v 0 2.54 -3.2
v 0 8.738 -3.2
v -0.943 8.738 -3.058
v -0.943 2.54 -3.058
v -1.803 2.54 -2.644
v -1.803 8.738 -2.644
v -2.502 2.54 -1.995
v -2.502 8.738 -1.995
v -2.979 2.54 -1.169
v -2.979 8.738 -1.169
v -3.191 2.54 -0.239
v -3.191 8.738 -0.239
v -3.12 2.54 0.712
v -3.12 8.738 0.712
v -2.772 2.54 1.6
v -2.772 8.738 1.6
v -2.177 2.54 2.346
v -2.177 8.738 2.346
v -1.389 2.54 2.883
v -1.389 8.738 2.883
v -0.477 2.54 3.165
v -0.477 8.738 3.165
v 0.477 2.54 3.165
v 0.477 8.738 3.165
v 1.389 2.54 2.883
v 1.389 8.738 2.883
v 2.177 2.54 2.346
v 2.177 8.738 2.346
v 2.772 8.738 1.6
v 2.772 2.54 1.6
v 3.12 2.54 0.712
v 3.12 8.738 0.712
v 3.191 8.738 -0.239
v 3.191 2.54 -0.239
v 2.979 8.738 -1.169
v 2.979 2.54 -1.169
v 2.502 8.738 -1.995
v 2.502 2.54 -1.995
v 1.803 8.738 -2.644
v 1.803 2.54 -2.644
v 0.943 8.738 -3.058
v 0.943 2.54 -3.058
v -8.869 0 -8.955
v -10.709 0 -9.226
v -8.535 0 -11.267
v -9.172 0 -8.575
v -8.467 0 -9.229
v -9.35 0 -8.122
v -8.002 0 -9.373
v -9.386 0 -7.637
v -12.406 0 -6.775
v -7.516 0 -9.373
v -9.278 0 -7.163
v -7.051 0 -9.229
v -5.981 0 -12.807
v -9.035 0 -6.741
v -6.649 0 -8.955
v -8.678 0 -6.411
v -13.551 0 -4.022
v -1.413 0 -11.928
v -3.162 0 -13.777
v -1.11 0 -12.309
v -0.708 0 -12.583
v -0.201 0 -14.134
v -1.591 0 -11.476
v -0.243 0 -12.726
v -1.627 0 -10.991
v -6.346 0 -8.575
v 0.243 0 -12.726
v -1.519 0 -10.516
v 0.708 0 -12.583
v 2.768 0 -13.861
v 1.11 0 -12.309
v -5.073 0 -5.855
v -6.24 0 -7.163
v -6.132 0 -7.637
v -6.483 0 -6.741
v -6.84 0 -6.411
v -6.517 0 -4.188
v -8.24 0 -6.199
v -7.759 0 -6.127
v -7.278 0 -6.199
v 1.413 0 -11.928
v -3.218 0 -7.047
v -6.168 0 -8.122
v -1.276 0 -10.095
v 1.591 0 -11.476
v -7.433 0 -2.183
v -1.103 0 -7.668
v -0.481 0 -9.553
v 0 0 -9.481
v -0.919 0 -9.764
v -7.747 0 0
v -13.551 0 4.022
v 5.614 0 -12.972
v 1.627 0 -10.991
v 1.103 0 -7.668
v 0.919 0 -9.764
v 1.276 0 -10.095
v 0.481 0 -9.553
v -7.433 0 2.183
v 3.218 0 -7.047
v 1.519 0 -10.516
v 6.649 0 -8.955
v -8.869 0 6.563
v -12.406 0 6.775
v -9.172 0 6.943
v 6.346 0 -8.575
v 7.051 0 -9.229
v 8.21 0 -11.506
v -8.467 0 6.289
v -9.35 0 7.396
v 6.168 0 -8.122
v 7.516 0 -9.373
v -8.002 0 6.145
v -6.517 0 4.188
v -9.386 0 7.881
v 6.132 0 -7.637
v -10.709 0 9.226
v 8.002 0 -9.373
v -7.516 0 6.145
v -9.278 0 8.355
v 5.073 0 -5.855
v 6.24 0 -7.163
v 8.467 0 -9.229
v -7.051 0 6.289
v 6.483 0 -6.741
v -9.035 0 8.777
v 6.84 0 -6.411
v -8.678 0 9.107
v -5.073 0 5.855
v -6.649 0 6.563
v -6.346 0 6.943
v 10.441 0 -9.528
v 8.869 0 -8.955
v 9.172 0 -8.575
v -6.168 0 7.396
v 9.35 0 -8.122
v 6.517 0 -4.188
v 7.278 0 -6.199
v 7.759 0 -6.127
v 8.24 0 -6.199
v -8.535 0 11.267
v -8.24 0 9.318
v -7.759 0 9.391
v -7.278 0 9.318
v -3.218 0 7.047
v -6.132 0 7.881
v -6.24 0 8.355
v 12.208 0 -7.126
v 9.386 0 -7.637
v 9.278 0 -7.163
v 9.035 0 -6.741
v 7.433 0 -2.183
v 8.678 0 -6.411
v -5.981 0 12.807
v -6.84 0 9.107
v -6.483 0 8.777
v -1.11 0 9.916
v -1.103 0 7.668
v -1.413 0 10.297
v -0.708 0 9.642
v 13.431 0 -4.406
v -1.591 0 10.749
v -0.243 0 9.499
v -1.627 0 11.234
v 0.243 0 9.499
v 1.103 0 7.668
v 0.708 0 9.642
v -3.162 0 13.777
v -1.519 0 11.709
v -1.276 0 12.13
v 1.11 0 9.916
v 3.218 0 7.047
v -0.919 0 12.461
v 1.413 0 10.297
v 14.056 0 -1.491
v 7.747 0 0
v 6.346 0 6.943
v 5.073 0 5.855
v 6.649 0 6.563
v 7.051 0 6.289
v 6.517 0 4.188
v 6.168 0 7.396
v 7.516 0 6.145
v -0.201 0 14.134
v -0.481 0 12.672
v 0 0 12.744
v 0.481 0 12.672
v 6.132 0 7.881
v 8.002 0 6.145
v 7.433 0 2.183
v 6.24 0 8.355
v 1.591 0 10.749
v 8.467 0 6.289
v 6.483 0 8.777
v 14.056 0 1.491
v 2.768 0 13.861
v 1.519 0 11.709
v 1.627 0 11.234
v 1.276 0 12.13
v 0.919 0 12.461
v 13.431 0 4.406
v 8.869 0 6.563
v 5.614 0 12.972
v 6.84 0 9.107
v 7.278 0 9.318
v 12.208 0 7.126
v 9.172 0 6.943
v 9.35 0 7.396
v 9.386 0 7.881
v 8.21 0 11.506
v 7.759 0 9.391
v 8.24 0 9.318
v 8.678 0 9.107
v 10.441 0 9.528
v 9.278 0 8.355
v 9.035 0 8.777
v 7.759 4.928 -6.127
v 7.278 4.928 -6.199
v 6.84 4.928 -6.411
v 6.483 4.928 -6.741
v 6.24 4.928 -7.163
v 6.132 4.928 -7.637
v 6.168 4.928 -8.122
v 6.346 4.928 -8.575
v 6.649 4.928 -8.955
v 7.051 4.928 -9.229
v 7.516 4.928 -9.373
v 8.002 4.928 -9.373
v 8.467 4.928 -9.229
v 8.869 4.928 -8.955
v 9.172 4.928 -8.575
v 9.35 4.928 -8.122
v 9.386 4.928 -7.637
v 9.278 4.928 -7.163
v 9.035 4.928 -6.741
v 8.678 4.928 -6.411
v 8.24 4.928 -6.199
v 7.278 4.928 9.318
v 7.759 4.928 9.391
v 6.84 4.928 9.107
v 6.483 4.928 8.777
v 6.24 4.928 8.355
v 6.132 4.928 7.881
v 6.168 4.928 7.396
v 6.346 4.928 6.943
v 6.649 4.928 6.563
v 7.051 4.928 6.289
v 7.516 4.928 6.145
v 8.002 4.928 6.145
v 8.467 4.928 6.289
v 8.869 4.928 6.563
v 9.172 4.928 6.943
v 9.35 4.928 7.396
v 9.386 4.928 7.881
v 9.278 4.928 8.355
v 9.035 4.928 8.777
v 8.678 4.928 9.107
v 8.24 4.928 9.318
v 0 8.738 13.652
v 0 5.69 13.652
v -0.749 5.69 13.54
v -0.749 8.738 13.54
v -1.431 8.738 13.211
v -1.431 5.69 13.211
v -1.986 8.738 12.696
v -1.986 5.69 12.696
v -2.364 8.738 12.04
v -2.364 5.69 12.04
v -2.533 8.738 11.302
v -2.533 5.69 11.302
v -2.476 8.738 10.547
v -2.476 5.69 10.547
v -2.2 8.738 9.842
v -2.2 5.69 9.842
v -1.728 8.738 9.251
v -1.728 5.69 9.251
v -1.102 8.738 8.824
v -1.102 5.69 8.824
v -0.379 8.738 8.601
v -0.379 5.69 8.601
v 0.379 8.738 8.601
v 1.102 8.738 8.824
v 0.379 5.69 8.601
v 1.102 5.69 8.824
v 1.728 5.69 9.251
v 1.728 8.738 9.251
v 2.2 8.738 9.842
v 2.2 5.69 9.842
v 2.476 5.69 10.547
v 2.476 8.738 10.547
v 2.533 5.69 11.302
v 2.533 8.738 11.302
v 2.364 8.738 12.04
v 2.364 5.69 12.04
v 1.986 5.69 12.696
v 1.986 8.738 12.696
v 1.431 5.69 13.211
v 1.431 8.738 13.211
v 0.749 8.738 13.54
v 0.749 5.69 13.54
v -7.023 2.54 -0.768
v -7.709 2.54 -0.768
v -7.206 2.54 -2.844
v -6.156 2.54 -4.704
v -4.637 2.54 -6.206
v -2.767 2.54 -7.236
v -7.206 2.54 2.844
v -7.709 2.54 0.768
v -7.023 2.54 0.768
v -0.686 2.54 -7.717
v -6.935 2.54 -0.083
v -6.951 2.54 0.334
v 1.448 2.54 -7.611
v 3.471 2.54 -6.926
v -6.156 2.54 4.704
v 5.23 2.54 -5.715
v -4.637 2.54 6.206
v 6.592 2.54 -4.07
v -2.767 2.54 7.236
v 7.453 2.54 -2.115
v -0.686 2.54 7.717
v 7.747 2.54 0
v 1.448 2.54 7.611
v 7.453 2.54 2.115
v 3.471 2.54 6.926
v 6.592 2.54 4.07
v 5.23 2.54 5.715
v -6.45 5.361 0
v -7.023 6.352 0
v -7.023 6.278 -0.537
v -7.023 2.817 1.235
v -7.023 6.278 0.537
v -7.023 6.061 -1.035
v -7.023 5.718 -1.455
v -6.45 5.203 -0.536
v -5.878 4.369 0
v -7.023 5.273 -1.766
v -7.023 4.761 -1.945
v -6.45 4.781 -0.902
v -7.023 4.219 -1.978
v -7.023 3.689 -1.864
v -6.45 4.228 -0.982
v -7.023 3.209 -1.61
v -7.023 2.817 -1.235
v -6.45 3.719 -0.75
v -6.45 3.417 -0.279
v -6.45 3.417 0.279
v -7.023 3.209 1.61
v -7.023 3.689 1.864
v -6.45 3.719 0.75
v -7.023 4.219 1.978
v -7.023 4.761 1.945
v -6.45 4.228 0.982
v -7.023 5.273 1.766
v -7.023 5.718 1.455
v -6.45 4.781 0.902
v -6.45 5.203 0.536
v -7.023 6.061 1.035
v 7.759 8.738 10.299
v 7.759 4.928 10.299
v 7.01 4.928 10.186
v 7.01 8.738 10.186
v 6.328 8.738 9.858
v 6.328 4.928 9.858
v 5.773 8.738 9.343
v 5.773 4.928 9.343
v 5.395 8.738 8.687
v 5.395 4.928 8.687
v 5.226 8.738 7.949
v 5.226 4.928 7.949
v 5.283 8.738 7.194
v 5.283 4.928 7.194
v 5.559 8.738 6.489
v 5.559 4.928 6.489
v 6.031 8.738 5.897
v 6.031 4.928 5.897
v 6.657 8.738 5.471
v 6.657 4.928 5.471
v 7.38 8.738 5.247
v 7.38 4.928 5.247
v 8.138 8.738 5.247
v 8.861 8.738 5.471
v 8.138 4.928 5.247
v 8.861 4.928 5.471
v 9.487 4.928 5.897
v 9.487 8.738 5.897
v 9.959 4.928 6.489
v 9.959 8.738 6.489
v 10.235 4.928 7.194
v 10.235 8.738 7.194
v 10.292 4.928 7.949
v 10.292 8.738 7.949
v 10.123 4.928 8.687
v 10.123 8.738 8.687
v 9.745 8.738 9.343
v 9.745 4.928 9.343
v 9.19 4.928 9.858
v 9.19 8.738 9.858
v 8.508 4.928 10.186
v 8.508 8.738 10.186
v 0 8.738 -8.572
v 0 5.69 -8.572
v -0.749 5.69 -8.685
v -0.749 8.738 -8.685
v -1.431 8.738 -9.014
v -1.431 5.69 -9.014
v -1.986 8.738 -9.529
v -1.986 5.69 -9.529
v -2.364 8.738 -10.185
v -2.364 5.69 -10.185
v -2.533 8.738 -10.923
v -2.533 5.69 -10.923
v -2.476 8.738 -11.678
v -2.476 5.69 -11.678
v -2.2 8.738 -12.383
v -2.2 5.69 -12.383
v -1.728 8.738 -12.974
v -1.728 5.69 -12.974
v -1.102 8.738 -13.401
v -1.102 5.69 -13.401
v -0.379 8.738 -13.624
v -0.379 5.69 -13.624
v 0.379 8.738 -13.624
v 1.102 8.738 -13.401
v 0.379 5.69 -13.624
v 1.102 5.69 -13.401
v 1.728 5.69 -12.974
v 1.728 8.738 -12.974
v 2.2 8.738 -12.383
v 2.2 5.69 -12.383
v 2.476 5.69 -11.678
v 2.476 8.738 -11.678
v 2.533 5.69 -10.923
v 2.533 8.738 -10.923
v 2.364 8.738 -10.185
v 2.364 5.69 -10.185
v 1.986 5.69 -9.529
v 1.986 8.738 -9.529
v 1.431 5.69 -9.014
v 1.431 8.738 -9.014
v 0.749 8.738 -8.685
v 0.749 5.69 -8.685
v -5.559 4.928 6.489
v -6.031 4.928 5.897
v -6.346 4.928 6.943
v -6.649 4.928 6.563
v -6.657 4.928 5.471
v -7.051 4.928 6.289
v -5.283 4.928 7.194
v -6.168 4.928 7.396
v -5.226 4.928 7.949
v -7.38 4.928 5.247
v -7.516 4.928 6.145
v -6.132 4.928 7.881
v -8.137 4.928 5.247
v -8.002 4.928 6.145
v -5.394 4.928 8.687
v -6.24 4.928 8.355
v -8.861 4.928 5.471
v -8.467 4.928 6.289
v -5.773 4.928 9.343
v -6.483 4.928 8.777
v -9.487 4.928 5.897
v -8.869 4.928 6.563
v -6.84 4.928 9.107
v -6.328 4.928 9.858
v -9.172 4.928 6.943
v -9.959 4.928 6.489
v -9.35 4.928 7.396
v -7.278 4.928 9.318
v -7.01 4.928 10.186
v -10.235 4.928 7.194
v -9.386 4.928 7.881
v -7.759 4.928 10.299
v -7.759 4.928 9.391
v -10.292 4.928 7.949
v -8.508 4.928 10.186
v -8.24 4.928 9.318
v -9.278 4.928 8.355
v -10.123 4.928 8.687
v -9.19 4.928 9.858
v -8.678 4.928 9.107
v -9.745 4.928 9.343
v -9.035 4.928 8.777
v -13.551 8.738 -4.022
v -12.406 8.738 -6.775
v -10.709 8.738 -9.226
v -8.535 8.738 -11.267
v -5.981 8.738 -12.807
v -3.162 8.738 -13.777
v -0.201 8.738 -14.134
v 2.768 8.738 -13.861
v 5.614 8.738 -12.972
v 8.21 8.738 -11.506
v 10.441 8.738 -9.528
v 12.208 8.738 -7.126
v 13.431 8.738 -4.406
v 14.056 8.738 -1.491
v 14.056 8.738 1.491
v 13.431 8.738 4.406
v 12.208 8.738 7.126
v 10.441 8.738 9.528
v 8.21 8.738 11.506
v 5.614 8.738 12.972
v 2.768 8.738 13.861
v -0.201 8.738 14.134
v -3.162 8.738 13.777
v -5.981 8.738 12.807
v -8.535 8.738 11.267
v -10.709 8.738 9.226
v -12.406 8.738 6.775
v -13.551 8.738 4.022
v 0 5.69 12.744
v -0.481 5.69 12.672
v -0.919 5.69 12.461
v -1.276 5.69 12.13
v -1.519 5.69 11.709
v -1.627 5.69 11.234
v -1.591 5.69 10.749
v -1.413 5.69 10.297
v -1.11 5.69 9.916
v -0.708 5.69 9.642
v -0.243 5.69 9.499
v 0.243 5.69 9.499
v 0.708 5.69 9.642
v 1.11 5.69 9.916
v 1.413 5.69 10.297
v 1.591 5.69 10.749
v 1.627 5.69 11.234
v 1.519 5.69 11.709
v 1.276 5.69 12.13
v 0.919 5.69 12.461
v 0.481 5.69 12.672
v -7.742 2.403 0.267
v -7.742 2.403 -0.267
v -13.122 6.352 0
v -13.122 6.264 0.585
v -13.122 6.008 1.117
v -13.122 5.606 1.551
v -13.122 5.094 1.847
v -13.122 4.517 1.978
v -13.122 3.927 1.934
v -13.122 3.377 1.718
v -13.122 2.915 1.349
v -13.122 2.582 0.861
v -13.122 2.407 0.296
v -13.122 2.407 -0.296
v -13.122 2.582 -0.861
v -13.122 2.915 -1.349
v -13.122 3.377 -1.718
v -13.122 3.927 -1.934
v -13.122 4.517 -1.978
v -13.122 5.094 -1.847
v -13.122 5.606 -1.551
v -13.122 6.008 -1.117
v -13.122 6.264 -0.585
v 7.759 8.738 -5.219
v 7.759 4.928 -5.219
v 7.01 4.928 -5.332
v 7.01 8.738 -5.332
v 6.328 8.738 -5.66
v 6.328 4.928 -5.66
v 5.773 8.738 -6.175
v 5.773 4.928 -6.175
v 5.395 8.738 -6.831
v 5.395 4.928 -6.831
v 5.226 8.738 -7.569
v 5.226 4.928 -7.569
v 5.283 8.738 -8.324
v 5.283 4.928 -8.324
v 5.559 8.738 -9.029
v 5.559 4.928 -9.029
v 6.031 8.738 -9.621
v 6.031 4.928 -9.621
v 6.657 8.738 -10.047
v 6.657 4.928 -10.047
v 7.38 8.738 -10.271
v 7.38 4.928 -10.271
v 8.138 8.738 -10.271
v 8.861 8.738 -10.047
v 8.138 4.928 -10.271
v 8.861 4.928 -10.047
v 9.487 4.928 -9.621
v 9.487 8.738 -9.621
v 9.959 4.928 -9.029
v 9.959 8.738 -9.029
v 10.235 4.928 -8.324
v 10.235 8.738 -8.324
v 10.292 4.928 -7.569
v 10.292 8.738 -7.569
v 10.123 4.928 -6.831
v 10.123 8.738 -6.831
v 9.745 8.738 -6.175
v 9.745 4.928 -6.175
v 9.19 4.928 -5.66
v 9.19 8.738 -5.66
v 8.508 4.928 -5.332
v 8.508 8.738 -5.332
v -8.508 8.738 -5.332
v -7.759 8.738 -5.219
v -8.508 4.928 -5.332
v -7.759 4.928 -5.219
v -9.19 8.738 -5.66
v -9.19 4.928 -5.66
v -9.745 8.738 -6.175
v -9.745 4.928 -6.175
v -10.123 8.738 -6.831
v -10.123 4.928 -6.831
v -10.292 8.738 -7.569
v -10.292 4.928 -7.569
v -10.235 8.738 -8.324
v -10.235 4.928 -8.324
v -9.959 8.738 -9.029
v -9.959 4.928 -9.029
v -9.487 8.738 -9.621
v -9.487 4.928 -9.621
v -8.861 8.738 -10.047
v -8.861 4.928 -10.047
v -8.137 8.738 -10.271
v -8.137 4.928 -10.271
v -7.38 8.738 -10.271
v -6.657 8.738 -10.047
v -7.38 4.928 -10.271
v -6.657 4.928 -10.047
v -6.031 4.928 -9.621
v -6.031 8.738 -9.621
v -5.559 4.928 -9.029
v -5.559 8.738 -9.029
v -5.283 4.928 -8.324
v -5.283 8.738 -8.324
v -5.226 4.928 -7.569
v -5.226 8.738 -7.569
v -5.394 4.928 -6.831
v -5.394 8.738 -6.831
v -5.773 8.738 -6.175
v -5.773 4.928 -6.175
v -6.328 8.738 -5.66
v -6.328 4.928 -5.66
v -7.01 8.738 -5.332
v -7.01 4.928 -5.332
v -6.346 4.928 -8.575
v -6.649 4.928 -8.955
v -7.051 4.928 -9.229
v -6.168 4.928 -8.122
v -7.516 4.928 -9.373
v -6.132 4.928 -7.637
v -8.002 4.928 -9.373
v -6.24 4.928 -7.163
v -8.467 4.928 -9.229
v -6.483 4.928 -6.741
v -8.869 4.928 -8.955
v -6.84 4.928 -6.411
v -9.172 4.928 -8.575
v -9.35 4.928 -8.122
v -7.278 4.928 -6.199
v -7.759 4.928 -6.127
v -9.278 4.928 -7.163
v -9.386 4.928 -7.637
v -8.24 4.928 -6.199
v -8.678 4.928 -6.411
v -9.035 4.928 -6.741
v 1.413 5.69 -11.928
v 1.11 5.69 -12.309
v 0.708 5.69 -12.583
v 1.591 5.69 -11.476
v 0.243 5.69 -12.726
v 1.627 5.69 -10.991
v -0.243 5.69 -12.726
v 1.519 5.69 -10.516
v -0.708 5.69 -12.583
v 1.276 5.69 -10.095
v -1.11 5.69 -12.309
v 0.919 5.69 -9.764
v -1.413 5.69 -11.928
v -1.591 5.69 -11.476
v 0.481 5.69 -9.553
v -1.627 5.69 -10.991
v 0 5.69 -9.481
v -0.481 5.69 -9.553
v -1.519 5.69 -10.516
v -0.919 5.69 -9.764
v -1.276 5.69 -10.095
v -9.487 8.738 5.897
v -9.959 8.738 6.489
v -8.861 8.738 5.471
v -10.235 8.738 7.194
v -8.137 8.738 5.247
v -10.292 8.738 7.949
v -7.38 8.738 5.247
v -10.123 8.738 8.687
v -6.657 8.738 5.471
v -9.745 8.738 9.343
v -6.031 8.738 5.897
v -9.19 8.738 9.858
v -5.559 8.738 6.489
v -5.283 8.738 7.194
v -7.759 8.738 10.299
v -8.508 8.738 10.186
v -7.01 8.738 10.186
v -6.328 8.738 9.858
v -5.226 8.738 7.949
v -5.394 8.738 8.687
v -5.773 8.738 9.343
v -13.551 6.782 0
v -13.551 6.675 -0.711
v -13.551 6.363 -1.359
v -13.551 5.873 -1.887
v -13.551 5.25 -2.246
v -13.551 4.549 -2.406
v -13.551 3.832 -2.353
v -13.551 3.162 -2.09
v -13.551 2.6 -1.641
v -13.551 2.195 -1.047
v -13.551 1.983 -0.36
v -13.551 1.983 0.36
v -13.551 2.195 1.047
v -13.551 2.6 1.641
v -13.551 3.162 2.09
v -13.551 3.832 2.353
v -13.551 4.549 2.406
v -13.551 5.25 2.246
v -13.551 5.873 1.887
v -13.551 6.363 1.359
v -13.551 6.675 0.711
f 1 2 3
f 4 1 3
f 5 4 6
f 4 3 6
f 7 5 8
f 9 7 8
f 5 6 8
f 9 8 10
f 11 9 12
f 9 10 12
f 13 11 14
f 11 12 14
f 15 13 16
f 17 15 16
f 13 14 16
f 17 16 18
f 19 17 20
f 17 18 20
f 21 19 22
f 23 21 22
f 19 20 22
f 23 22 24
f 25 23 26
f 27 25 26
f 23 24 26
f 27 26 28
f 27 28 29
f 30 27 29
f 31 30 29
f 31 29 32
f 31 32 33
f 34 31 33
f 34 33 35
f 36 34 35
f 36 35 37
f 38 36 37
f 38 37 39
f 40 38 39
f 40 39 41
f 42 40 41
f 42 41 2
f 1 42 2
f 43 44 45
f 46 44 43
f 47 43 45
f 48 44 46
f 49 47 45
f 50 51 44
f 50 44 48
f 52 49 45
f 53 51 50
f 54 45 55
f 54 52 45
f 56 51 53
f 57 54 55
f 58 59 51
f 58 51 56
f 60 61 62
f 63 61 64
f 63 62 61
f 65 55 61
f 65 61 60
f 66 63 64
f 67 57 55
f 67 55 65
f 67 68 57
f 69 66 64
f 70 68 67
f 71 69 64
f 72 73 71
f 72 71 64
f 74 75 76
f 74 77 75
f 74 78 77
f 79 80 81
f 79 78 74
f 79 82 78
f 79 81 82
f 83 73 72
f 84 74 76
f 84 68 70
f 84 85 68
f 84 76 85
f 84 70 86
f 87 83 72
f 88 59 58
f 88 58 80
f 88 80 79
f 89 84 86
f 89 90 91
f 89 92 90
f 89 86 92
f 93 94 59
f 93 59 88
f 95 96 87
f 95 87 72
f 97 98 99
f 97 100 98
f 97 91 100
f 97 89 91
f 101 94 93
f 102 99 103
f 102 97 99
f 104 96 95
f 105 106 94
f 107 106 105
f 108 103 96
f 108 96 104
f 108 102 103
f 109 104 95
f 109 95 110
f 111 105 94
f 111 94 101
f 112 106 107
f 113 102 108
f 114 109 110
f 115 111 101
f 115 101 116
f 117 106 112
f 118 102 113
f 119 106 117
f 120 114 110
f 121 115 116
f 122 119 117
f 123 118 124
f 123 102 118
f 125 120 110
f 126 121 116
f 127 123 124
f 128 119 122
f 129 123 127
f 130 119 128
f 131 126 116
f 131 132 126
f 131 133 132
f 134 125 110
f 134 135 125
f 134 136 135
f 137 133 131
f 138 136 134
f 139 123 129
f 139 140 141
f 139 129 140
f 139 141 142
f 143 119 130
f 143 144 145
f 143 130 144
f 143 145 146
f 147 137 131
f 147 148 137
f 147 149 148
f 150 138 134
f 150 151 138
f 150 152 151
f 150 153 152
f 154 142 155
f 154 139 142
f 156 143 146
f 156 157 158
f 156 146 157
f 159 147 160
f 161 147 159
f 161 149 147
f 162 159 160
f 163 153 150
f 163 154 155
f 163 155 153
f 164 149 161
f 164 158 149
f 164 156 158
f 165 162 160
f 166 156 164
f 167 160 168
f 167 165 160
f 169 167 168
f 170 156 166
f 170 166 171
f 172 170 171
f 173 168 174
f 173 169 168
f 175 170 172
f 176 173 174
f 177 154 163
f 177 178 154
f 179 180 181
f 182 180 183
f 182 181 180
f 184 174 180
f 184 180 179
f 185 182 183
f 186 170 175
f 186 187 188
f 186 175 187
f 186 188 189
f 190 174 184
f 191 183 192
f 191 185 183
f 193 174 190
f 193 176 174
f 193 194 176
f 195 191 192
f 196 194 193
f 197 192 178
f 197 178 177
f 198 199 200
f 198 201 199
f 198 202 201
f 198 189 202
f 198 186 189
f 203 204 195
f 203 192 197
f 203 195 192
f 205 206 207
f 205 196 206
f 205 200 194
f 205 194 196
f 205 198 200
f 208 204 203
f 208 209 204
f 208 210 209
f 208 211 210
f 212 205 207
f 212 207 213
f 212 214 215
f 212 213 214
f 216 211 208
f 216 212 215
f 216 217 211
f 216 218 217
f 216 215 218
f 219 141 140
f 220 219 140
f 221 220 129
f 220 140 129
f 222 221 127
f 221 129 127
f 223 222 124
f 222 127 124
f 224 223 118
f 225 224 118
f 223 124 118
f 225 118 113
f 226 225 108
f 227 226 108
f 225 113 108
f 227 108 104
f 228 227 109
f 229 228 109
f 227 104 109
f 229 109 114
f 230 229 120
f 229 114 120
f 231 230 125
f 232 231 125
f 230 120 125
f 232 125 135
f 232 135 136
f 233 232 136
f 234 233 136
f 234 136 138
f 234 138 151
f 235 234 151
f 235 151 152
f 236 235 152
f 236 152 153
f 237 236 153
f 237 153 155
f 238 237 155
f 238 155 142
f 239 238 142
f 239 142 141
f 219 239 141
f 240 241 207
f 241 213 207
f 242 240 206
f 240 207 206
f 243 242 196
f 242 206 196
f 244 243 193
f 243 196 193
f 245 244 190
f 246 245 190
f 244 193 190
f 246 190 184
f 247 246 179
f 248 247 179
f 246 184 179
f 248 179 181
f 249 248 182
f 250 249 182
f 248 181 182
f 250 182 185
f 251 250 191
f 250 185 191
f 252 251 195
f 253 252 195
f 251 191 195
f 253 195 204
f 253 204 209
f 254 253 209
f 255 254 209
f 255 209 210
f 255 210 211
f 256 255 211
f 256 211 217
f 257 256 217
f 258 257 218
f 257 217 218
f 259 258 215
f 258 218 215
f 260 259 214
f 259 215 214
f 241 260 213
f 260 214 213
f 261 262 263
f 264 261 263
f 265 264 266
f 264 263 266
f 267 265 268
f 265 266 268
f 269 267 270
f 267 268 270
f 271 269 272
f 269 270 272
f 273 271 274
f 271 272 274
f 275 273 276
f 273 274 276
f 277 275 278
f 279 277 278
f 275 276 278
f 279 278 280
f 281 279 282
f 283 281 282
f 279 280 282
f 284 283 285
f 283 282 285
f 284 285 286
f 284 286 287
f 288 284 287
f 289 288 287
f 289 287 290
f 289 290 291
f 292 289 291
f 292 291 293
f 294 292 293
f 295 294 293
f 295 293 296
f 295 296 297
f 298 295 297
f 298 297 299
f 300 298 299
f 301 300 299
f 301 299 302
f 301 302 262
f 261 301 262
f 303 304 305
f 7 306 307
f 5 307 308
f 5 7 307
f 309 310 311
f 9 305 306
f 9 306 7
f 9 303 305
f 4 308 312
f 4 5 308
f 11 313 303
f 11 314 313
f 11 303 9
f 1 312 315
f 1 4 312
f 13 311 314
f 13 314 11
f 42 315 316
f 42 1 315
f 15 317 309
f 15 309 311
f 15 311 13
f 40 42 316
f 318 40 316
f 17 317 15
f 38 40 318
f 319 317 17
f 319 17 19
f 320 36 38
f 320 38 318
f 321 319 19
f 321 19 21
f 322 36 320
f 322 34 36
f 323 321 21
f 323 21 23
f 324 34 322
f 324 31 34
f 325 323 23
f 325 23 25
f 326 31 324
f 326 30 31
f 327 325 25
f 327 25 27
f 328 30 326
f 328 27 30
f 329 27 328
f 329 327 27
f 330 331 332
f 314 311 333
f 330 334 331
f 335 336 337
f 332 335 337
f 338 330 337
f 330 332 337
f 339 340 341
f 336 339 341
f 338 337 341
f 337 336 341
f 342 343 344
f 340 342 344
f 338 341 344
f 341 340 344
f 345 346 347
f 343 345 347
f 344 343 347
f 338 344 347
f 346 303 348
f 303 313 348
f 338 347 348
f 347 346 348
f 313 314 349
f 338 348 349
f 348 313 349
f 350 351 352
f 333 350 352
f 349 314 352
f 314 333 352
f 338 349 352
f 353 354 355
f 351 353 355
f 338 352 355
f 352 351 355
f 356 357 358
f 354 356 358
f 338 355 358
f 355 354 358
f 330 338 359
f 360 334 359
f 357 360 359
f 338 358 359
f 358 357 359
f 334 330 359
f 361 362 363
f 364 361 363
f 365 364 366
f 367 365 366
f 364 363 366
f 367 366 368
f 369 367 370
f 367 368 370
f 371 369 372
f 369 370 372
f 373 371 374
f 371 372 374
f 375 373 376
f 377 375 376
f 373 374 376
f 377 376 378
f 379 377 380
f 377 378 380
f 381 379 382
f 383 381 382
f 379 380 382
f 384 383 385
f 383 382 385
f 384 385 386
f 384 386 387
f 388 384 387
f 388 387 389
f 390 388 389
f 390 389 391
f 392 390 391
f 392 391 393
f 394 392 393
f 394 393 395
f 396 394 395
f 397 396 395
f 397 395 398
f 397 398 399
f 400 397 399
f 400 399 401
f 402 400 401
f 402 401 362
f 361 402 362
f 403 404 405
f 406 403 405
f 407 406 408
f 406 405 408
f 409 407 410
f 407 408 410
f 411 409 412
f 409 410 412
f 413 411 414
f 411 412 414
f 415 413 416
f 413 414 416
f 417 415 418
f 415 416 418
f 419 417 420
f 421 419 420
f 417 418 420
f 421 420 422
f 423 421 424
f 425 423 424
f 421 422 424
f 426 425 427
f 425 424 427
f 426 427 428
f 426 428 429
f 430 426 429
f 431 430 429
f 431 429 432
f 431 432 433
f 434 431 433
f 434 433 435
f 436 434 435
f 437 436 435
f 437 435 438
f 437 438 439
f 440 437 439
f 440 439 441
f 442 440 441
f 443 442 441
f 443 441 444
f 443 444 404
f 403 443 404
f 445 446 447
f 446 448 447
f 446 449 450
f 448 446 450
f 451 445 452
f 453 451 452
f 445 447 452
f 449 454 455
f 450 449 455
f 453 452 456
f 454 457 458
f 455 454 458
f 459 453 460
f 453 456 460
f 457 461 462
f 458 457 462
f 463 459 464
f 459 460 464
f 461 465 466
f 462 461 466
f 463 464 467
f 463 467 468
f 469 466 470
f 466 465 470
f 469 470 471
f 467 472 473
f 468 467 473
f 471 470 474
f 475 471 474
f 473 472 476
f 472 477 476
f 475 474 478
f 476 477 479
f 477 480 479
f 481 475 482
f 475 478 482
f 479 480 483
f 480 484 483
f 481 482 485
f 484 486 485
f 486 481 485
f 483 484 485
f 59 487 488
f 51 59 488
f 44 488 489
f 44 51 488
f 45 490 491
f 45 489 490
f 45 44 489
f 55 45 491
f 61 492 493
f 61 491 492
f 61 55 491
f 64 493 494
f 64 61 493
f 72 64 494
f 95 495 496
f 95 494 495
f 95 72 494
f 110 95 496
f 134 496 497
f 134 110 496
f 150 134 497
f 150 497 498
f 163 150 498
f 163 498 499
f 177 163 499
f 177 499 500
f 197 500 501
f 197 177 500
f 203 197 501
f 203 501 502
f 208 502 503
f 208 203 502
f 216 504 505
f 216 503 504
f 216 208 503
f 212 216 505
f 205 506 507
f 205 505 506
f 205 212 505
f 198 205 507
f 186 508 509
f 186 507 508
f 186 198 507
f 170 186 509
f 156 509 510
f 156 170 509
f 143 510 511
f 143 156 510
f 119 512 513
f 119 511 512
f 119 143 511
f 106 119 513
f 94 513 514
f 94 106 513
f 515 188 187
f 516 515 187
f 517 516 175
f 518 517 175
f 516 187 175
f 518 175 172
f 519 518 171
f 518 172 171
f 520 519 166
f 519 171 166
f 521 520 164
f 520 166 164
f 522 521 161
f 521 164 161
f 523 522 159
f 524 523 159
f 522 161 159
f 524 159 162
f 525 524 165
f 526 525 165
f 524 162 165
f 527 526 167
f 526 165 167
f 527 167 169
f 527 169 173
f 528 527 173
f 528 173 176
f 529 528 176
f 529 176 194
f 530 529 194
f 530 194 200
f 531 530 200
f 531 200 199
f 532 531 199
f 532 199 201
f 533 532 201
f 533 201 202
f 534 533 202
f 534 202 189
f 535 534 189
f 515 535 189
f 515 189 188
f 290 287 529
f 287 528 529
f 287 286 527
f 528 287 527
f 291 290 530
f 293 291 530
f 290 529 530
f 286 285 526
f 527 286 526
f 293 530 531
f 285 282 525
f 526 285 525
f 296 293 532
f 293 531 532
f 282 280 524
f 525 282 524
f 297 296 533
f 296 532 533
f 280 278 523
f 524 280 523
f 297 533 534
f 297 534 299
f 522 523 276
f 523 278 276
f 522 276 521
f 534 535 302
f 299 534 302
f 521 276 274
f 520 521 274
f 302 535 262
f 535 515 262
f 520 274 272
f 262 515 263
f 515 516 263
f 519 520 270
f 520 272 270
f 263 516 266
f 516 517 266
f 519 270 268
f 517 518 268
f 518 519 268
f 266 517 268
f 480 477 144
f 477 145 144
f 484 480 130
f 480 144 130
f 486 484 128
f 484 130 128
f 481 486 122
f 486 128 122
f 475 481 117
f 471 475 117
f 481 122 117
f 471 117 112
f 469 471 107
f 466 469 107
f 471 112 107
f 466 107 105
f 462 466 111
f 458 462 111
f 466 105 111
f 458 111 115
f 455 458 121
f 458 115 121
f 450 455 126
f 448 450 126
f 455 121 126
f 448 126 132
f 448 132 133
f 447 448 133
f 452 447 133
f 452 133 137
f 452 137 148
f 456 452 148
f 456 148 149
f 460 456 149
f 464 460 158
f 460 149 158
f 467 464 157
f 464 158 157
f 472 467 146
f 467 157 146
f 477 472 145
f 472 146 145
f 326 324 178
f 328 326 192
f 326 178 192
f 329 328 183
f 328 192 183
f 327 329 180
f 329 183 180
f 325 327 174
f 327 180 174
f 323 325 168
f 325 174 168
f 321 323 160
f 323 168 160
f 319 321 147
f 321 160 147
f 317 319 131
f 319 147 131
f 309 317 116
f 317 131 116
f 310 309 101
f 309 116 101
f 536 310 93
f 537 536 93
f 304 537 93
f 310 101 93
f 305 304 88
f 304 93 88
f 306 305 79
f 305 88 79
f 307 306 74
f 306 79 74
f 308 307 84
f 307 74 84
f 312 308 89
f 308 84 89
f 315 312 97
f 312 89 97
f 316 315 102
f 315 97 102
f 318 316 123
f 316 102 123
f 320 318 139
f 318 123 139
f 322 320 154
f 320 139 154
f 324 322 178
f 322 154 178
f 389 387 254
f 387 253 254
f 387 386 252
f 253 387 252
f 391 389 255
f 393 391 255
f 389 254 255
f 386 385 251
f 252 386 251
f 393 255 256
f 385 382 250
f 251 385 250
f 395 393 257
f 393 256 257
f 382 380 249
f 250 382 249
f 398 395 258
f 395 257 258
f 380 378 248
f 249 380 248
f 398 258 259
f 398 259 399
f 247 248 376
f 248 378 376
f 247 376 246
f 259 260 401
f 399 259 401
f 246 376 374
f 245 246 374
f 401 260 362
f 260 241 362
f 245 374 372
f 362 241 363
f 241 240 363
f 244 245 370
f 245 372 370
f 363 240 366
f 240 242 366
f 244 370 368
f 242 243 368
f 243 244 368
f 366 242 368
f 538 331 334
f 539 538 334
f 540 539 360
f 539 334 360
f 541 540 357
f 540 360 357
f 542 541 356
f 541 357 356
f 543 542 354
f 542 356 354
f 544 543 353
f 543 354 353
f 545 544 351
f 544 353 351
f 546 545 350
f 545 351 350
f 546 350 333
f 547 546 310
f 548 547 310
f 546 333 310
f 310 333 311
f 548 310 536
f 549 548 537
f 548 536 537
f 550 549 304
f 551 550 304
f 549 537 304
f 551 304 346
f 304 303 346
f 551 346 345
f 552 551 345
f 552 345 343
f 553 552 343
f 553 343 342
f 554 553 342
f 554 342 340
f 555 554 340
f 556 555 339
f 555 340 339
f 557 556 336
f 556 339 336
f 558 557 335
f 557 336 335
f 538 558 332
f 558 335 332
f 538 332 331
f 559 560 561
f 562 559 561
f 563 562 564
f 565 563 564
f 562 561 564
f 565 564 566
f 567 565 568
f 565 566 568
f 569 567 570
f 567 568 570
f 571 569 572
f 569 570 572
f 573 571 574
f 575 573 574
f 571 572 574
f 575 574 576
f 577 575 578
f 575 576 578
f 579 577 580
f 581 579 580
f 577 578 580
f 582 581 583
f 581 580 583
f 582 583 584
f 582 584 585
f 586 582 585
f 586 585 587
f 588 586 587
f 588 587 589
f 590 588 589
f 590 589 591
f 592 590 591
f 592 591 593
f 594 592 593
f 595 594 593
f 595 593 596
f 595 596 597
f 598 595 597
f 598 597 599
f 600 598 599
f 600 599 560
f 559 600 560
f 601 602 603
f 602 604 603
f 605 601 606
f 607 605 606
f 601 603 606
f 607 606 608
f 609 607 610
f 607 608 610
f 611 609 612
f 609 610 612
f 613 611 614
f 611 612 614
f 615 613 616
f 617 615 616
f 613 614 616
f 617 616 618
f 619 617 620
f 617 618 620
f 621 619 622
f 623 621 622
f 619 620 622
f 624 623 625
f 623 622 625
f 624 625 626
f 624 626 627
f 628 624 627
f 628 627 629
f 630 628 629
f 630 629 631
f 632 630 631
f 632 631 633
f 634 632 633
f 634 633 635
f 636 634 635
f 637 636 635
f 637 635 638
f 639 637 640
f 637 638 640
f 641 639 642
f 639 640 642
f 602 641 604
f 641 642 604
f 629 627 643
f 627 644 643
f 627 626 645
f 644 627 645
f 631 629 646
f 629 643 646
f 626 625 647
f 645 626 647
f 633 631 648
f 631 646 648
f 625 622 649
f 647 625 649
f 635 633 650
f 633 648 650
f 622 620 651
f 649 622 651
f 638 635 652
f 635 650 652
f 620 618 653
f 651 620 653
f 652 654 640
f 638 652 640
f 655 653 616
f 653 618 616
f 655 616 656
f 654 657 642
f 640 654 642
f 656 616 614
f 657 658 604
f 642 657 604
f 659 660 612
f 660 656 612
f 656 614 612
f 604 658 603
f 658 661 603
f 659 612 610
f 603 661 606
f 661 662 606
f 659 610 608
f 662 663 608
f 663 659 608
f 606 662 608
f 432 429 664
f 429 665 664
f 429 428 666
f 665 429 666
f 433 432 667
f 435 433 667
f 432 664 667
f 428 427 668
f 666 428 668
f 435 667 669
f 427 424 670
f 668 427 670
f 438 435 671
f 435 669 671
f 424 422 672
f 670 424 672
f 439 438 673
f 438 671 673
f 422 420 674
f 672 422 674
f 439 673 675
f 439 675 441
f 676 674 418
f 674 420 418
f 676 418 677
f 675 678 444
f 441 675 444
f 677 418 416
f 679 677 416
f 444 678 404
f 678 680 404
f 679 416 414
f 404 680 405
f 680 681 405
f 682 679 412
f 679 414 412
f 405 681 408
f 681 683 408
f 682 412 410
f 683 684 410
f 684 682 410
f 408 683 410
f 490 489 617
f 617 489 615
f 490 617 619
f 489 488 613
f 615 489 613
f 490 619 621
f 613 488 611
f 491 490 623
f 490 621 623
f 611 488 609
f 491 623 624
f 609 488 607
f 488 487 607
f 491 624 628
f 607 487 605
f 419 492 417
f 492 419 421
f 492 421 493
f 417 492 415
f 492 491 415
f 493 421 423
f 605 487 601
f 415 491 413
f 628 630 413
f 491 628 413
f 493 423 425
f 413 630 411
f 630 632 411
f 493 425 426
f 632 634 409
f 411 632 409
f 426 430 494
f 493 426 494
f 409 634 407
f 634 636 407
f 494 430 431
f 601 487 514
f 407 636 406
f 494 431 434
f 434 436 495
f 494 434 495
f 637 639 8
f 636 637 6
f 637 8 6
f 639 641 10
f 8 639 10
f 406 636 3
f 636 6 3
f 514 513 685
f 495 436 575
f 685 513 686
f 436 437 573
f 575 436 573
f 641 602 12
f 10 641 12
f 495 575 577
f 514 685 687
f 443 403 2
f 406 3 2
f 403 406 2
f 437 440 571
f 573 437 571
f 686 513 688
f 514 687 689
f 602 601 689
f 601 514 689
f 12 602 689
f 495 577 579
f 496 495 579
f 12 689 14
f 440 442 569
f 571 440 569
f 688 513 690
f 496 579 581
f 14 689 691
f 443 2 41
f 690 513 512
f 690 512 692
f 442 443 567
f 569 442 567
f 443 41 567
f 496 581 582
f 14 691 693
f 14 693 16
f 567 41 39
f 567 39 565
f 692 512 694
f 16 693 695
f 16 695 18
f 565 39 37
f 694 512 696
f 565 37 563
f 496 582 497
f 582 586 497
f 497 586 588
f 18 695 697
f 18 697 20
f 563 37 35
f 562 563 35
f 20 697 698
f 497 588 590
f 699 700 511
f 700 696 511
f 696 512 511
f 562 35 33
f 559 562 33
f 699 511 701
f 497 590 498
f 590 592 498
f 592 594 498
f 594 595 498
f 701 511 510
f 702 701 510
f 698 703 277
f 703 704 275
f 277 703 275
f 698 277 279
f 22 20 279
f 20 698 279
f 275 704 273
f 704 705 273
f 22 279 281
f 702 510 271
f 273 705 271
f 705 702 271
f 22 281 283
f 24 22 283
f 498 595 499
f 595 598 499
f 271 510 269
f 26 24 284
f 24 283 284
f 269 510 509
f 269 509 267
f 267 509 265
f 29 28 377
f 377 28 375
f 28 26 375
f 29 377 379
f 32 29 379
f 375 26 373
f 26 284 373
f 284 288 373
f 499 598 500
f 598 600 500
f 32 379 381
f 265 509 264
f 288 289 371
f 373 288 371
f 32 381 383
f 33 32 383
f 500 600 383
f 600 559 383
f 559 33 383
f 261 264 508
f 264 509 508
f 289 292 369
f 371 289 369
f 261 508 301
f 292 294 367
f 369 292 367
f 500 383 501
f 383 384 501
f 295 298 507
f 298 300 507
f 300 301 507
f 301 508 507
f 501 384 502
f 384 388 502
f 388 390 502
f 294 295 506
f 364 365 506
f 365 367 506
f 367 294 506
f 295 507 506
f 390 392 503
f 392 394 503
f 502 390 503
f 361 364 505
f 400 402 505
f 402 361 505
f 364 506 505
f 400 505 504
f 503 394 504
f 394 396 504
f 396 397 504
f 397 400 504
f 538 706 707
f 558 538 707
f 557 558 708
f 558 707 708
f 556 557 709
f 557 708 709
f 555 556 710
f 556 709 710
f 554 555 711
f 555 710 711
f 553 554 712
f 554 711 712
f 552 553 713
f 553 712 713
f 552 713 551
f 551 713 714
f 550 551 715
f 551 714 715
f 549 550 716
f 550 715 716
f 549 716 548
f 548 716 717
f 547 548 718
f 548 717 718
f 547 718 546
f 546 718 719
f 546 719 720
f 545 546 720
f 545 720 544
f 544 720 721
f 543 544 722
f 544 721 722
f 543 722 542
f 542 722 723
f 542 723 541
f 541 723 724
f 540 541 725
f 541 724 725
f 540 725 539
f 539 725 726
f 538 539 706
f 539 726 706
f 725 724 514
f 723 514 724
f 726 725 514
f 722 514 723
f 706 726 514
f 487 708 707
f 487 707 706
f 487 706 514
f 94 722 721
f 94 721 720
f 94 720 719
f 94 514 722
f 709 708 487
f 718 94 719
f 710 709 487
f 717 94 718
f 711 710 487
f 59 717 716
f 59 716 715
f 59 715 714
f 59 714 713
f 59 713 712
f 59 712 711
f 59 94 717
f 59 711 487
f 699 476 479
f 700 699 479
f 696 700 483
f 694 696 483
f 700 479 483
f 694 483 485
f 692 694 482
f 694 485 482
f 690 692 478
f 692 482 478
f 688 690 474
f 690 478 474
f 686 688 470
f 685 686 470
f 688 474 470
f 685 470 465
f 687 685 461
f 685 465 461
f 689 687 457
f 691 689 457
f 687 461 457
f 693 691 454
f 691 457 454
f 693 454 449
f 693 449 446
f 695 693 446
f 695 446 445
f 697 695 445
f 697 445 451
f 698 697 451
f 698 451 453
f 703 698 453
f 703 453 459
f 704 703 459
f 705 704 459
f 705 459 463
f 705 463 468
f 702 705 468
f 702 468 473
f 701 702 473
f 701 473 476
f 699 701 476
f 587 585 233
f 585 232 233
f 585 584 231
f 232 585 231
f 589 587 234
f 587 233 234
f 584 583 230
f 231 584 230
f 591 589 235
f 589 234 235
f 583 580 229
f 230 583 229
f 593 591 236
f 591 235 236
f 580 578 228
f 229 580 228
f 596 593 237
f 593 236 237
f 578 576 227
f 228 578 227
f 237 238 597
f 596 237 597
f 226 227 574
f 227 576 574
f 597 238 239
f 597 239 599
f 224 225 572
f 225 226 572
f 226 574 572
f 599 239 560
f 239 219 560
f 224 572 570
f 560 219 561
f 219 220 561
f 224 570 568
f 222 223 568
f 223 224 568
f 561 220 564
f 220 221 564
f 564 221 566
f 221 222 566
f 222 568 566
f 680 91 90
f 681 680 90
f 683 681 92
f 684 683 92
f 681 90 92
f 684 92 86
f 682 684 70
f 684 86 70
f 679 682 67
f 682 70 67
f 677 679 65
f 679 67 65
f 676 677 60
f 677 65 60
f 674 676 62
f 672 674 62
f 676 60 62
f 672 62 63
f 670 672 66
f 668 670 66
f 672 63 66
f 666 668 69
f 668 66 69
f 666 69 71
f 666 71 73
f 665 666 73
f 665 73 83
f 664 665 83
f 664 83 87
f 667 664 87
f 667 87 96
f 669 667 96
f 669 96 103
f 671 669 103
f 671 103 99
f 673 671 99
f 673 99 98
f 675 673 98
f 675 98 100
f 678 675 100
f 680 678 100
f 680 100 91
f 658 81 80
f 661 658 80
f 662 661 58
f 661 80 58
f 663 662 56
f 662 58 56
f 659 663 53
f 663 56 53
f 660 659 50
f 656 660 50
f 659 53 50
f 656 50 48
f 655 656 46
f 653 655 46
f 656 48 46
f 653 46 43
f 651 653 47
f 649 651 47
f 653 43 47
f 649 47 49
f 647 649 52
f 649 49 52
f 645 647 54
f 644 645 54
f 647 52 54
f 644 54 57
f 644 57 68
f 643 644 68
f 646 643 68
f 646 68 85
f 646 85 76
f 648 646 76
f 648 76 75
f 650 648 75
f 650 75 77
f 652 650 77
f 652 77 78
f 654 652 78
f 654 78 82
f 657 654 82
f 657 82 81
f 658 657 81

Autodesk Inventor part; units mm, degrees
sketch "Sketch_1" plane through (0, 0, 0) normal (0, 0, 1) x (1, 0, 0)
  line L0 (0, 0) -> (0, 8.7376)
  line L1 (0, 8.7376) -> (14.1351, 8.7376)
  line L2 (14.1351, 8.7376) -> (14.1351, 0)
  line L3 (14.1351, 0) -> (0, 0)
  line L4 (0, 0) -> (0, 8.7376)
revolve "Revolution1" add sketch "Sketch_1" angle 360 about axis through (0, 0, 0) along (0, -1, 0)
sketch "Sketch_63" plane through (0, 0, 0) normal (0, 1, 0) x (-1, 0, 0)
  line L0 (20.6184, 14.1351) -> (13.5509, 14.1351)
  line L1 (13.5509, 14.1351) -> (13.5509, -14.1351)
  line L2 (13.5509, -14.1351) -> (20.6184, -14.1351)
  line L3 (20.6184, -14.1351) -> (20.6184, 14.1351)
extrude "Extrusion1" cut sketch "Sketch_63" along normal blind 8.7376
sketch "Sketch_37" plane through (0, 0, 0) normal (0, 0, 1) x (1, 0, 0)
  line L0 (-5.8778, 4.3688) -> (-14.1351, 4.3688)
  line L1 (-14.1351, 4.3688) -> (-14.1351, 8.3376)
  line L2 (-14.1351, 8.3376) -> (-13.5509, 8.3376)
  line L3 (-13.5509, 8.3376) -> (-13.5509, 6.7818)
  line L4 (-13.5509, 6.7818) -> (-13.1216, 6.3525)
  line L5 (-13.1216, 6.3525) -> (-7.0231, 6.3525)
  line L6 (-7.0231, 6.3525) -> (-5.8778, 4.3688)
  line L7 (-5.8778, 4.3688) -> (-14.1351, 4.3688)
revolve "Revolution2" cut sketch "Sketch_37" angle 360 about axis through (-5.8778, 4.3688, 0) along (1, 0, 0)
thread "Thread1" size "10-32 UNF" class "2B" standard "ANSI Unified Screw Threads" length 4.6507
sketch "Sketch4" plane through (0, 0, 0) normal (0, -1, 0) x (1, 0, 0)
  point P0 (0, 0)
hole "Hole1" at (0, 0, 0) direction (0, 1, 0) diameter 6.4008 depth 8.7376
sketch "Sketch_9" plane through (0, 0, 0) normal (0, 0, 1) x (1, 0, 0)
  line L0 (0, 0) -> (0, 2.54)
  line L1 (0, 2.54) -> (7.747, 2.54)
  line L2 (7.747, 2.54) -> (7.747, 0)
  line L3 (7.747, 0) -> (0, 0)
  line L4 (0, 0) -> (0, 2.54)
revolve "Revolution3" cut sketch "Sketch_9" angle 360 about axis through (0, 0, 0) along (0, -1, 0)
sketch "Sketch6" plane through (0, 8.7376, 0) normal (0, 1, 0) x (1, 0, 0)
  point P0 (0, -11.1125)
hole "Hole2" at (0, 8.7376, 11.1125) direction (0, -1, 0) diameter 3.2639 depth 8.7376 counterbore diameter 5.08 counterbore depth 3.048
sketch "Sketch7" plane through (0, 8.7376, 0) normal (0, 1, 0) x (1, 0, 0)
  point P0 (0, 11.1125)
hole "Hole3" at (0, 8.7376, -11.1125) direction (0, -1, 0) diameter 3.2639 depth 8.7376 counterbore diameter 5.08 counterbore depth 3.048
sketch "Sketch8" plane through (0, 8.7376, 0) normal (0, 1, 0) x (1, 0, 0)
  point P0 (-7.7589, 7.7589)
hole "Hole4" at (-7.7589, 8.7376, -7.7589) direction (0, -1, 0) diameter 3.2639 depth 8.7376 counterbore diameter 5.08 counterbore depth 3.81
pattern_linear "Rectangular Pattern1" count 2 spacing 15.5179 along (1, 0, 0) count 2 spacing 15.5179 along (0, 0, 1) of "Hole4"
ref_plane "a1_XY" through (0, 8.7376, -14.1351) normal (0, 1, 0) x (1, 0, 0)
ref_plane "a1_YZ" through (0, 8.7376, -14.1351) normal (1, 0, 0) x (0, 0, -1)
ref_plane "a1_ZX" through (0, 8.7376, -14.1351) normal (0, 0, -1) x (0, 1, 0)
ref_plane "a2_XY" through (0, 8.7376, 14.1351) normal (0, 1, 0) x (1, 0, 0)
ref_plane "a2_YZ" through (0, 8.7376, 14.1351) normal (1, 0, 0) x (0, 0, -1)
ref_plane "a2_ZX" through (0, 8.7376, 14.1351) normal (0, 0, -1) x (0, 1, 0)
ref_plane "ab_tr1_XY" through (-7.5198, 0, -2.0149) normal (0, 1, 0) x (1, 0, 0)
ref_plane "ab_tr1_YZ" through (-7.5198, 0, -2.0149) normal (1, 0, 0) x (0, 0, -1)
ref_plane "ab_tr1_ZX" through (-7.5198, 0, -2.0149) normal (0, 0, -1) x (0, 1, 0)
ref_plane "ab_tr2_XY" through (7.5198, 0, 2.0149) normal (0, 1, 0) x (1, 0, 0)
ref_plane "ab_tr2_YZ" through (7.5198, 0, 2.0149) normal (1, 0, 0) x (0, 0, -1)
ref_plane "ab_tr2_ZX" through (7.5198, 0, 2.0149) normal (0, 0, -1) x (0, 1, 0)
ref_plane "ab_tr3_XY" through (-2.0149, 0, 7.5198) normal (0, 1, 0) x (1, 0, 0)
ref_plane "ab_tr3_YZ" through (-2.0149, 0, 7.5198) normal (1, 0, 0) x (0, 0, -1)
ref_plane "ab_tr3_ZX" through (-2.0149, 0, 7.5198) normal (0, 0, -1) x (0, 1, 0)
ref_plane "ab_tr4_XY" through (2.0149, 0, -7.5198) normal (0, 1, 0) x (1, 0, 0)
ref_plane "ab_tr4_YZ" through (2.0149, 0, -7.5198) normal (1, 0, 0) x (0, 0, -1)
ref_plane "ab_tr4_ZX" through (2.0149, 0, -7.5198) normal (0, 0, -1) x (0, 1, 0)
ref_plane "ar3_XY" through (-7.9026, 2.54, 7.9026) normal (0, 1, 0) x (1, 0, 0)
ref_plane "ar3_YZ" through (-7.9026, 2.54, 7.9026) normal (1, 0, 0) x (0, 0, -1)
ref_plane "ar3_ZX" through (-7.9026, 2.54, 7.9026) normal (0, 0, -1) x (0, 1, 0)
ref_plane "ar4_XY" through (7.9026, 2.54, 7.9026) normal (0, 1, 0) x (1, 0, 0)
ref_plane "ar4_YZ" through (7.9026, 2.54, 7.9026) normal (1, 0, 0) x (0, 0, -1)
ref_plane "ar4_ZX" through (7.9026, 2.54, 7.9026) normal (0, 0, -1) x (0, 1, 0)
ref_plane "ar5_XY" through (7.9026, 2.54, -7.9026) normal (0, 1, 0) x (1, 0, 0)
ref_plane "ar5_YZ" through (7.9026, 2.54, -7.9026) normal (1, 0, 0) x (0, 0, -1)
ref_plane "ar5_ZX" through (7.9026, 2.54, -7.9026) normal (0, 0, -1) x (0, 1, 0)
ref_plane "ar6_XY" through (-7.9026, 2.54, -7.9026) normal (0, 1, 0) x (1, 0, 0)
ref_plane "ar6_YZ" through (-7.9026, 2.54, -7.9026) normal (1, 0, 0) x (0, 0, -1)
ref_plane "ar6_ZX" through (-7.9026, 2.54, -7.9026) normal (0, 0, -1) x (0, 1, 0)
ref_plane "b1_XY" through (0, 8.7376, 0) normal (0, 1, 0) x (1, 0, 0)
ref_plane "b1_YZ" through (0, 8.7376, 0) normal (1, 0, 0) x (0, 0, -1)
ref_plane "b1_ZX" through (0, 8.7376, 0) normal (0, 0, -1) x (0, 1, 0)
ref_plane "j_XY" through (0, 0, 0) normal (0, 1, 0) x (1, 0, 0)
ref_plane "j_YZ" through (0, 0, 0) normal (1, 0, 0) x (0, 0, -1)
ref_plane "j_ZX" through (0, 0, 0) normal (0, 0, -1) x (0, 1, 0)
ref_plane "k1_XY" through (-13.5509, 4.3688, 0) normal (0, 0, 1) x (1, 0, 0)
ref_plane "k1_YZ" through (-13.5509, 4.3688, 0) normal (1, 0, 0) x (0, 1, 0)
ref_plane "k1_ZX" through (-13.5509, 4.3688, 0) normal (0, 1, 0) x (0, 0, 1)
ref_plane "k2_XY" through (-13.5509, 8.7376, 0) normal (0, 0, 1) x (1, 0, 0)
ref_plane "k2_YZ" through (-13.5509, 8.7376, 0) normal (1, 0, 0) x (0, 1, 0)
ref_plane "k2_ZX" through (-13.5509, 8.7376, 0) normal (0, 1, 0) x (0, 0, 1)
ref_plane "l1_XY" through (-13.5509, 6.7818, 0) normal (0, 0, 1) x (1, 0, 0)
ref_plane "l1_YZ" through (-13.5509, 6.7818, 0) normal (1, 0, 0) x (0, 1, 0)
ref_plane "l1_ZX" through (-13.5509, 6.7818, 0) normal (0, 1, 0) x (0, 0, 1)
ref_plane "l2_XY" through (-13.5509, 1.9558, 0) normal (0, 0, 1) x (1, 0, 0)
ref_plane "l2_YZ" through (-13.5509, 1.9558, 0) normal (1, 0, 0) x (0, 1, 0)
ref_plane "l2_ZX" through (-13.5509, 1.9558, 0) normal (0, 1, 0) x (0, 0, 1)
ref_plane "nut_XY" through (0, 15.9766, 0) normal (0, 1, 0) x (1, 0, 0)
ref_plane "nut_YZ" through (0, 15.9766, 0) normal (1, 0, 0) x (0, 0, -1)
ref_plane "nut_ZX" through (0, 15.9766, 0) normal (0, 0, -1) x (0, 1, 0)
ref_plane "po1_XY" through (7.7589, 0, 7.7589) normal (0, 1, 0) x (1, 0, 0)
ref_plane "po1_YZ" through (7.7589, 0, 7.7589) normal (1, 0, 0) x (0, 0, -1)
ref_plane "po1_ZX" through (7.7589, 0, 7.7589) normal (0, 0, -1) x (0, 1, 0)
ref_plane "po2_XY" through (7.7589, 0, -7.7589) normal (0, 1, 0) x (1, 0, 0)
ref_plane "po2_YZ" through (7.7589, 0, -7.7589) normal (1, 0, 0) x (0, 0, -1)
ref_plane "po2_ZX" through (7.7589, 0, -7.7589) normal (0, 0, -1) x (0, 1, 0)
ref_plane "po3_XY" through (-7.7589, 0, -7.7589) normal (0, 1, 0) x (1, 0, 0)
ref_plane "po3_YZ" through (-7.7589, 0, -7.7589) normal (1, 0, 0) x (0, 0, -1)
ref_plane "po3_ZX" through (-7.7589, 0, -7.7589) normal (0, 0, -1) x (0, 1, 0)
ref_plane "po4_XY" through (-7.7589, 0, 7.7589) normal (0, 1, 0) x (1, 0, 0)
ref_plane "po4_YZ" through (-7.7589, 0, 7.7589) normal (1, 0, 0) x (0, 0, -1)
ref_plane "po4_ZX" through (-7.7589, 0, 7.7589) normal (0, 0, -1) x (0, 1, 0)
ref_plane "r7_XY" through (1.7526, 8.7376, 11.1125) normal (0, 1, 0) x (1, 0, 0)
ref_plane "r7_YZ" through (1.7526, 8.7376, 11.1125) normal (1, 0, 0) x (0, 0, -1)
ref_plane "r7_ZX" through (1.7526, 8.7376, 11.1125) normal (0, 0, -1) x (0, 1, 0)
ref_plane "r71_XY" through (0, 8.7376, 11.1125) normal (0, 1, 0) x (1, 0, 0)
ref_plane "r71_YZ" through (0, 8.7376, 11.1125) normal (1, 0, 0) x (0, 0, -1)
ref_plane "r71_ZX" through (0, 8.7376, 11.1125) normal (0, 0, -1) x (0, 1, 0)
ref_plane "r72_XY" through (-1.7526, 8.7376, 11.1125) normal (0, 1, 0) x (1, 0, 0)
ref_plane "r72_YZ" through (-1.7526, 8.7376, 11.1125) normal (1, 0, 0) x (0, 0, -1)
ref_plane "r72_ZX" through (-1.7526, 8.7376, 11.1125) normal (0, 0, -1) x (0, 1, 0)
ref_plane "r73_XY" through (0, 8.7376, -11.1125) normal (0, 1, 0) x (1, 0, 0)
ref_plane "r73_YZ" through (0, 8.7376, -11.1125) normal (1, 0, 0) x (0, 0, -1)
ref_plane "r73_ZX" through (0, 8.7376, -11.1125) normal (0, 0, -1) x (0, 1, 0)
ref_plane "rg_XY" through (0, 8.7376, 0) normal (0, 1, 0) x (1, 0, 0)
ref_plane "rg_YZ" through (0, 8.7376, 0) normal (1, 0, 0) x (0, 0, -1)
ref_plane "rg_ZX" through (0, 8.7376, 0) normal (0, 0, -1) x (0, 1, 0)
ref_plane "rh_XY" through (0, 8.7376, 0) normal (0, 1, 0) x (1, 0, 0)
ref_plane "rh_YZ" through (0, 8.7376, 0) normal (1, 0, 0) x (0, 0, -1)
ref_plane "rh_ZX" through (0, 8.7376, 0) normal (0, 0, -1) x (0, 1, 0)
ref_plane "rs_1_XY" through (0, 10.5156, -11.1125) normal (0, 1, 0) x (1, 0, 0)
ref_plane "rs_1_YZ" through (0, 10.5156, -11.1125) normal (1, 0, 0) x (0, 0, -1)
ref_plane "rs_1_ZX" through (0, 10.5156, -11.1125) normal (0, 0, -1) x (0, 1, 0)
ref_plane "rs_2_XY" through (-11.1125, 10.5156, 0) normal (0, 1, 0) x (1, 0, 0)
ref_plane "rs_2_YZ" through (-11.1125, 10.5156, 0) normal (1, 0, 0) x (0, 0, -1)
ref_plane "rs_2_ZX" through (-11.1125, 10.5156, 0) normal (0, 0, -1) x (0, 1, 0)
ref_plane "rs_3_XY" through (0, 10.5156, 11.1125) normal (0, 1, 0) x (1, 0, 0)
ref_plane "rs_3_YZ" through (0, 10.5156, 11.1125) normal (1, 0, 0) x (0, 0, -1)
ref_plane "rs_3_ZX" through (0, 10.5156, 11.1125) normal (0, 0, -1) x (0, 1, 0)
ref_plane "rs_4_XY" through (11.1125, 10.5156, 0) normal (0, 1, 0) x (1, 0, 0)
ref_plane "rs_4_YZ" through (11.1125, 10.5156, 0) normal (1, 0, 0) x (0, 0, -1)
ref_plane "rs_4_ZX" through (11.1125, 10.5156, 0) normal (0, 0, -1) x (0, 1, 0)
ref_plane "sc1_XY" through (7.7589, 4.9276, -7.7589) normal (0, 1, 0) x (1, 0, 0)
ref_plane "sc1_YZ" through (7.7589, 4.9276, -7.7589) normal (1, 0, 0) x (0, 0, -1)
ref_plane "sc1_ZX" through (7.7589, 4.9276, -7.7589) normal (0, 0, -1) x (0, 1, 0)
ref_plane "sc2_XY" through (-7.7589, 4.9276, -7.7589) normal (0, 1, 0) x (1, 0, 0)
ref_plane "sc2_YZ" through (-7.7589, 4.9276, -7.7589) normal (1, 0, 0) x (0, 0, -1)
ref_plane "sc2_ZX" through (-7.7589, 4.9276, -7.7589) normal (0, 0, -1) x (0, 1, 0)
ref_plane "sc3_XY" through (-7.7589, 4.9276, 7.7589) normal (0, 1, 0) x (1, 0, 0)
ref_plane "sc3_YZ" through (-7.7589, 4.9276, 7.7589) normal (1, 0, 0) x (0, 0, -1)
ref_plane "sc3_ZX" through (-7.7589, 4.9276, 7.7589) normal (0, 0, -1) x (0, 1, 0)
ref_plane "sc4_XY" through (7.7589, 4.9276, 7.7589) normal (0, 1, 0) x (1, 0, 0)
ref_plane "sc4_YZ" through (7.7589, 4.9276, 7.7589) normal (1, 0, 0) x (0, 0, -1)
ref_plane "sc4_ZX" through (7.7589, 4.9276, 7.7589) normal (0, 0, -1) x (0, 1, 0)
ref_plane "to_dummy_XY" through (0, 8.7376, 0) normal (0, 1, 0) x (1, 0, 0)
ref_plane "to_dummy_YZ" through (0, 8.7376, 0) normal (1, 0, 0) x (0, 0, -1)
ref_plane "to_dummy_ZX" through (0, 8.7376, 0) normal (0, 0, -1) x (0, 1, 0)
ref_plane "to_nut_XY" through (0, 10.3124, 0) normal (0, 1, 0) x (1, 0, 0)
ref_plane "to_nut_YZ" through (0, 10.3124, 0) normal (1, 0, 0) x (0, 0, -1)
ref_plane "to_nut_ZX" through (0, 10.3124, 0) normal (0, 0, -1) x (0, 1, 0)
ref_plane "to_rod_XY" through (0, 0, 0) normal (0, 1, 0) x (1, 0, 0)
ref_plane "to_rod_YZ" through (0, 0, 0) normal (1, 0, 0) x (0, 0, -1)
ref_plane "to_rod_ZX" through (0, 0, 0) normal (0, 0, -1) x (0, 1, 0)
ref_plane "to_tube_XY" through (0, 2.54, 0) normal (0, 1, 0) x (1, 0, 0)
ref_plane "to_tube_YZ" through (0, 2.54, 0) normal (1, 0, 0) x (0, 0, -1)
ref_plane "to_tube_ZX" through (0, 2.54, 0) normal (0, 0, -1) x (0, 1, 0)
ref_plane "to_wiper_XY" through (0, 8.7376, 0) normal (0, 1, 0) x (1, 0, 0)
ref_plane "to_wiper_YZ" through (0, 8.7376, 0) normal (1, 0, 0) x (0, 0, -1)
ref_plane "to_wiper_ZX" through (0, 8.7376, 0) normal (0, 0, -1) x (0, 1, 0)
ref_plane "track1_XY" through (-7.7851, 0, 0) normal (0, 1, 0) x (1, 0, 0)
ref_plane "track1_YZ" through (-7.7851, 0, 0) normal (1, 0, 0) x (0, 0, -1)
ref_plane "track1_ZX" through (-7.7851, 0, 0) normal (0, 0, -1) x (0, 1, 0)
ref_plane "track2_XY" through (0, 0, -7.7851) normal (0, 1, 0) x (1, 0, 0)
ref_plane "track2_YZ" through (0, 0, -7.7851) normal (1, 0, 0) x (0, 0, -1)
ref_plane "track2_ZX" through (0, 0, -7.7851) normal (0, 0, -1) x (0, 1, 0)
ref_plane "track3_XY" through (7.7851, 0, 0) normal (0, 1, 0) x (1, 0, 0)
ref_plane "track3_YZ" through (7.7851, 0, 0) normal (1, 0, 0) x (0, 0, -1)
ref_plane "track3_ZX" through (7.7851, 0, 0) normal (0, 0, -1) x (0, 1, 0)
ref_plane "track4_XY" through (0, 0, 7.7851) normal (0, 1, 0) x (1, 0, 0)
ref_plane "track4_YZ" through (0, 0, 7.7851) normal (1, 0, 0) x (0, 0, -1)
ref_plane "track4_ZX" through (0, 0, 7.7851) normal (0, 0, -1) x (0, 1, 0)
properties part number "02-1NT-0.125-FO1_BM_heads-bif"
